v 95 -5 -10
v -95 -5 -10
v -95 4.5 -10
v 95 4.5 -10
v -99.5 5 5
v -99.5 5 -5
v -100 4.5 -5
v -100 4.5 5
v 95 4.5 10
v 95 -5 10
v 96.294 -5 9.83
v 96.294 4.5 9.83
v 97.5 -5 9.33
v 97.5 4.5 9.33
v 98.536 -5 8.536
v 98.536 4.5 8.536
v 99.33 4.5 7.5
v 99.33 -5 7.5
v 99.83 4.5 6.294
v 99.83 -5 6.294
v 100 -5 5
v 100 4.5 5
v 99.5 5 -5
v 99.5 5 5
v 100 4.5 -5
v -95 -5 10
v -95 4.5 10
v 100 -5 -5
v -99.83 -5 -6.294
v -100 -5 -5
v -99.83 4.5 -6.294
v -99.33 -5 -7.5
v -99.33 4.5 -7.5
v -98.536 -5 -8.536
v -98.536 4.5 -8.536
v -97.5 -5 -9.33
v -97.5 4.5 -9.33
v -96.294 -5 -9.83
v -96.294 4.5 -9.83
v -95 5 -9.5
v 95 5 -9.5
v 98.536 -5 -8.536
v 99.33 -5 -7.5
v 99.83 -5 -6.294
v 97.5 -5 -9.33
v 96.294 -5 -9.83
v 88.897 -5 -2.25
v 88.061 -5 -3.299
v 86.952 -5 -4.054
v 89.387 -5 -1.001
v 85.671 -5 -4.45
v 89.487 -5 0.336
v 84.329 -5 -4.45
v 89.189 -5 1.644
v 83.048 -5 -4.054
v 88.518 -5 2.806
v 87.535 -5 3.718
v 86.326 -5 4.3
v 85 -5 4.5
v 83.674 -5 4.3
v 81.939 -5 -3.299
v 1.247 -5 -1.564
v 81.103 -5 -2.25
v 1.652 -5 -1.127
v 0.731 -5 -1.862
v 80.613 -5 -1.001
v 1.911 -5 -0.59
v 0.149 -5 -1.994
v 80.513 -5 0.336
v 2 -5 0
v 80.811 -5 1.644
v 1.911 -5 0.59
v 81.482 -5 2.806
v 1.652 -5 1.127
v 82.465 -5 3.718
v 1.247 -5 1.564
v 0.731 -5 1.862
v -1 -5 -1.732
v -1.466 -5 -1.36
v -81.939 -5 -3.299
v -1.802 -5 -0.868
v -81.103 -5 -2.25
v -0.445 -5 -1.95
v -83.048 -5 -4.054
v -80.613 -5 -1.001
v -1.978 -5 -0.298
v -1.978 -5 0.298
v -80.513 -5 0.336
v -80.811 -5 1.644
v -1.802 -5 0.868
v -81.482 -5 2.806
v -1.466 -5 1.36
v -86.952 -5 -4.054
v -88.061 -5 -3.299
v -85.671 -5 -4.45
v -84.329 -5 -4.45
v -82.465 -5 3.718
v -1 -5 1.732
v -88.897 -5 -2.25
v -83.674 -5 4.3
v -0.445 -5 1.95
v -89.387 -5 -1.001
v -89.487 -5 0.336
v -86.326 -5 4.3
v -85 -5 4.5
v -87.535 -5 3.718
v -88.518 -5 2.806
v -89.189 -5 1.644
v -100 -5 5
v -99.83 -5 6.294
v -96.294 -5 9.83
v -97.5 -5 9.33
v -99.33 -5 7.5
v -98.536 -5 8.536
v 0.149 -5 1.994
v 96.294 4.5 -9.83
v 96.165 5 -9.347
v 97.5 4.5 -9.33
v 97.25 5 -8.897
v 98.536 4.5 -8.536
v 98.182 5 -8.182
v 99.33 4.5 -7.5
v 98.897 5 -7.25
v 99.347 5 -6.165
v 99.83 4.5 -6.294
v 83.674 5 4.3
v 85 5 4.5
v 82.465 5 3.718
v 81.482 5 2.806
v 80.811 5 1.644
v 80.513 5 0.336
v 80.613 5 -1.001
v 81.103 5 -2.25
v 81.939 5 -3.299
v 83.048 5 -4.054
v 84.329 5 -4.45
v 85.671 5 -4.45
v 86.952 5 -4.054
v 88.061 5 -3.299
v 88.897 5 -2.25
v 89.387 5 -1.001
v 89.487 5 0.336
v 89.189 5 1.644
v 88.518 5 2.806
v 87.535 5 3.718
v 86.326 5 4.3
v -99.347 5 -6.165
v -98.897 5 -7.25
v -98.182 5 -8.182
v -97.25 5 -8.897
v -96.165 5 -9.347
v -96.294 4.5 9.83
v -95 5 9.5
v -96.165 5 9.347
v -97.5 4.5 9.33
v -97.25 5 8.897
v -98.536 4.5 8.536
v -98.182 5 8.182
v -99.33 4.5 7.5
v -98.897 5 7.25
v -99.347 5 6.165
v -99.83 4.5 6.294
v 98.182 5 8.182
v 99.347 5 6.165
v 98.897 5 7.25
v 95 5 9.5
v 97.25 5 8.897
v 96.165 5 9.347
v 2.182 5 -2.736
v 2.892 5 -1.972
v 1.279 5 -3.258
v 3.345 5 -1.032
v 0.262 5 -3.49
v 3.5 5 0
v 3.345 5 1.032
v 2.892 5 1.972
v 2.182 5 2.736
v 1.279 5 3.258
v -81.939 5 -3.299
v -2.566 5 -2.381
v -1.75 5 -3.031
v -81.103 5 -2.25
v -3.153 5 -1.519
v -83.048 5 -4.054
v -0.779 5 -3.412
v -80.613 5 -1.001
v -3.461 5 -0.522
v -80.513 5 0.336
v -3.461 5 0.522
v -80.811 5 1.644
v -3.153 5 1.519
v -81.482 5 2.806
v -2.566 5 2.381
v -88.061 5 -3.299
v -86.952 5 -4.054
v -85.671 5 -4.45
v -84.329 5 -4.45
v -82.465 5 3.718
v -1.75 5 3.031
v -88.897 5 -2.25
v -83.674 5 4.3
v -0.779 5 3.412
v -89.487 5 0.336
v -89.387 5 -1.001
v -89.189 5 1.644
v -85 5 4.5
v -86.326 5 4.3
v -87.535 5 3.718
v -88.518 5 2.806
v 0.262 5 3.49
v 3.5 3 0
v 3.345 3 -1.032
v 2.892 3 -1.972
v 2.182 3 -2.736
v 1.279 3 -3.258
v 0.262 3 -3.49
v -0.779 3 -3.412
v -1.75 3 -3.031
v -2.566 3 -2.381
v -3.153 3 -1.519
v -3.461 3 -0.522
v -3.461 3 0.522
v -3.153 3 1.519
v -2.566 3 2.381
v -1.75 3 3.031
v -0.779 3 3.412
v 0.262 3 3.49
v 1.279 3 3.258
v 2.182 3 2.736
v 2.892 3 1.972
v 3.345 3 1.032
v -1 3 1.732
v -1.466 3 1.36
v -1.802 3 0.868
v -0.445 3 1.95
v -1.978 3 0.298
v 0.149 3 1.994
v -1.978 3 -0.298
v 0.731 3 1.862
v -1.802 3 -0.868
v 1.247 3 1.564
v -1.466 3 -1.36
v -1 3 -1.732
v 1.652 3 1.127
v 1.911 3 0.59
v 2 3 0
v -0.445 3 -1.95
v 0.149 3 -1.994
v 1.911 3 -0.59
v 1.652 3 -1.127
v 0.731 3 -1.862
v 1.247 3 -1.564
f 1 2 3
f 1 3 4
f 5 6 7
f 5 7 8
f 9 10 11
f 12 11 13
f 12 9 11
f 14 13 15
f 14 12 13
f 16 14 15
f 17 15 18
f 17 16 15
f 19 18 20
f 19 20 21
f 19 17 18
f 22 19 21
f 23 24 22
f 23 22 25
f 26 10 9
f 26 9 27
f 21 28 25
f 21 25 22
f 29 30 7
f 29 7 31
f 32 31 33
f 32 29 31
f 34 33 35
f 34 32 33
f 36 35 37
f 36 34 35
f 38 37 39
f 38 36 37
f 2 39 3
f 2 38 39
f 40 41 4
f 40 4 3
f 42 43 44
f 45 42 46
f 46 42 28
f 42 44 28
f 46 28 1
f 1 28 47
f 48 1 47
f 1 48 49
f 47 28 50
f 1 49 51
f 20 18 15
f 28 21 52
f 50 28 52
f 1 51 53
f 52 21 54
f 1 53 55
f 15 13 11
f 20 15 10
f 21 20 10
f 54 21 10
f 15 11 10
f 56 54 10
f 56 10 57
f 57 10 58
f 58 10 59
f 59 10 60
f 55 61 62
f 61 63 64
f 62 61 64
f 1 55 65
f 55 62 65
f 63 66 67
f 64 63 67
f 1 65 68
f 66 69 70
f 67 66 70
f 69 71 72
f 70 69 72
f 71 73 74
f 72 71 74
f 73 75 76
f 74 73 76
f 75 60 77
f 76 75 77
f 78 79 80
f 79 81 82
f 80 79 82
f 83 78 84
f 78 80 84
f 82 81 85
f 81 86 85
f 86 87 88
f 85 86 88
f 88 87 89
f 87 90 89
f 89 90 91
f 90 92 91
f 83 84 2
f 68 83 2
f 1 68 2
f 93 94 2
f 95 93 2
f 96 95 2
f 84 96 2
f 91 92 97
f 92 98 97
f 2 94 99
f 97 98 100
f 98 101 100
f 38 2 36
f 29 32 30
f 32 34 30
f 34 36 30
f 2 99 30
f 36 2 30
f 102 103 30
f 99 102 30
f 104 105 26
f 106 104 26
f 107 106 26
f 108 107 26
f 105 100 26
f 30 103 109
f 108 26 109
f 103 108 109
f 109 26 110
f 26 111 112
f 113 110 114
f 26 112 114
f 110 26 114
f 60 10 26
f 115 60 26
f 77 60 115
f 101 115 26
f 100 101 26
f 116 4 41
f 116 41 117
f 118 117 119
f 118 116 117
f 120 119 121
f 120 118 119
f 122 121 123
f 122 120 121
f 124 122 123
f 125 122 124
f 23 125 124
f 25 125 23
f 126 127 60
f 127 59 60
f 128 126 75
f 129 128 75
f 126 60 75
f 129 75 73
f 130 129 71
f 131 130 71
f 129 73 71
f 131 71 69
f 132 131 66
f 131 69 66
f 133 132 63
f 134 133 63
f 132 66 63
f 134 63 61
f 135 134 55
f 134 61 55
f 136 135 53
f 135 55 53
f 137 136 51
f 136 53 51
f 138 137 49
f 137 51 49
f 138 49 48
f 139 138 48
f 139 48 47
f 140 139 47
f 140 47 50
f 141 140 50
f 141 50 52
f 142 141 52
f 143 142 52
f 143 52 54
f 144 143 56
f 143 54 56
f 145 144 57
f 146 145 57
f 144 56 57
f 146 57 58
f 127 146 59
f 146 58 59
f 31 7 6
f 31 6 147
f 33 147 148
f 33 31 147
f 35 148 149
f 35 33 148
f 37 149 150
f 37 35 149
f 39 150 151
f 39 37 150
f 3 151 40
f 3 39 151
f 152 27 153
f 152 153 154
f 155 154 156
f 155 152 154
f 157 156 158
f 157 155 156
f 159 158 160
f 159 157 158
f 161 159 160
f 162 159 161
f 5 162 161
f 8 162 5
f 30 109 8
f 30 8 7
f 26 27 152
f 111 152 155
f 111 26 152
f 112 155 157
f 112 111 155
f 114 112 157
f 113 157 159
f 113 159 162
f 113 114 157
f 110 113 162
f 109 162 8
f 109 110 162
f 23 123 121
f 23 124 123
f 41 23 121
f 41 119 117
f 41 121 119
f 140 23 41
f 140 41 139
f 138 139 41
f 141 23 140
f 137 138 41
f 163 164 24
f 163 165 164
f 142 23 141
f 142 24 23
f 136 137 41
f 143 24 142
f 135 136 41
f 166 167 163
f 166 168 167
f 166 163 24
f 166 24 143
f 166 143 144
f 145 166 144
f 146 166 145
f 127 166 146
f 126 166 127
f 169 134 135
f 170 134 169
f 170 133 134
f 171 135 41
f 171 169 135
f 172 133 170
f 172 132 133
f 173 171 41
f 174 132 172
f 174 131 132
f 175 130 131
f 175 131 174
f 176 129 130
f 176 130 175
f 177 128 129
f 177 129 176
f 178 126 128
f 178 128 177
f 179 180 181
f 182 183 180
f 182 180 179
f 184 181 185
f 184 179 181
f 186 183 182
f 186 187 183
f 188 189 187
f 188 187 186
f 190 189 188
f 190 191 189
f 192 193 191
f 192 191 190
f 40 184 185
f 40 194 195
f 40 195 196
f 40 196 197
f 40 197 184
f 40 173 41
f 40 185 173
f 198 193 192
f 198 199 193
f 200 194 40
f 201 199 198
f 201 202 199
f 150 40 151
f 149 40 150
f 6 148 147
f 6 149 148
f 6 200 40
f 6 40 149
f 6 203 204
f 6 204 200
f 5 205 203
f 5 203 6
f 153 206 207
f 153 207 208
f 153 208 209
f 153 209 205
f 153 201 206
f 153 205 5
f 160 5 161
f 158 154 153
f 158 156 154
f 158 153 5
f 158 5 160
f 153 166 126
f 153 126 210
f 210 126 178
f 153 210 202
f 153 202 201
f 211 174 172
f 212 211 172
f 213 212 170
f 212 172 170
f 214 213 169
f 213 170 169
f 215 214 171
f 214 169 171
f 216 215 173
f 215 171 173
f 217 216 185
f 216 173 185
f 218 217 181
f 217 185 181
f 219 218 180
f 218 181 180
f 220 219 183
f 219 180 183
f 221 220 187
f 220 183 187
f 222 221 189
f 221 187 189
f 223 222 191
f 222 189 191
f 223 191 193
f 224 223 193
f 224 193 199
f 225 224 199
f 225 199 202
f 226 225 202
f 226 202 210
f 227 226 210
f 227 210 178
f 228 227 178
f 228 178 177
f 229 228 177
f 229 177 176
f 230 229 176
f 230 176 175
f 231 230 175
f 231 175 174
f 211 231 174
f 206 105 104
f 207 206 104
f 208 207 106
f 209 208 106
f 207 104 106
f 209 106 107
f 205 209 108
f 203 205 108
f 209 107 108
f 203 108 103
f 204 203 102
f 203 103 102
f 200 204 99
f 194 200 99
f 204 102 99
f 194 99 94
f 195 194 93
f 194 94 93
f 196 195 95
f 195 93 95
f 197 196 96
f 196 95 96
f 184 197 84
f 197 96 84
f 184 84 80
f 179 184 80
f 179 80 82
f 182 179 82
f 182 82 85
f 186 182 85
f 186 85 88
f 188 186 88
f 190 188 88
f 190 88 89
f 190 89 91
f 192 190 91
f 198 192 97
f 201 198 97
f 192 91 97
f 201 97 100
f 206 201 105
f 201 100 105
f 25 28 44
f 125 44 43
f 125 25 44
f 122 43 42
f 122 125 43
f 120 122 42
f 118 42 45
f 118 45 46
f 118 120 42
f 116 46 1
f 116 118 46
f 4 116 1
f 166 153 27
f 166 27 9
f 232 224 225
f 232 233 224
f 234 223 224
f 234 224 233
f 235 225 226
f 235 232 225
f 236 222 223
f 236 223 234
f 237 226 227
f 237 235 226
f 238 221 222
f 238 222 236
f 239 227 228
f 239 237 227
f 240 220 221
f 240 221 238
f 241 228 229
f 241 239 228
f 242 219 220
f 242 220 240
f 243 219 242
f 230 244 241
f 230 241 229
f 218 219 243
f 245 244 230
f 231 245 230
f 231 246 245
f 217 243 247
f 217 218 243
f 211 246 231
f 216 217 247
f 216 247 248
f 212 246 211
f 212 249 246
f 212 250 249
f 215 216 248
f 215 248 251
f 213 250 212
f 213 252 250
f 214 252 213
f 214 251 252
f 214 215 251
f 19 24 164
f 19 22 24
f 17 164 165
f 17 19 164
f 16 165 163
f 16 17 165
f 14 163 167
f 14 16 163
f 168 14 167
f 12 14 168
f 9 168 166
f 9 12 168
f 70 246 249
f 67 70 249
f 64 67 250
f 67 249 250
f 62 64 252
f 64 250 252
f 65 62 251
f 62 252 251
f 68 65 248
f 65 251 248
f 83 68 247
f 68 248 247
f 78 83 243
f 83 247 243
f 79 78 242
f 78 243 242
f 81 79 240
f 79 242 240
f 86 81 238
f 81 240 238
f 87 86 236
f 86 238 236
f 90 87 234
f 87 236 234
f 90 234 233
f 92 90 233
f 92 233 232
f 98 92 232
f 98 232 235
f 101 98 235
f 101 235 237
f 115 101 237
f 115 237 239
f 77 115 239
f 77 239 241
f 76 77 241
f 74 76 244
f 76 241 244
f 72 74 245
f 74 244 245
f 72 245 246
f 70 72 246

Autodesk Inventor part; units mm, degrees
ref_plane "YZ Plane" through (0, 0, 0) normal (1, 0, 0) x (0, 1, 0)
ref_plane "XZ Plane" through (0, 0, 0) normal (0, 1, 0) x (-1, 0, 0)
ref_plane "XY Plane" through (0, 0, 0) normal (0, 0, 1) x (1, 0, 0)
sketch "Sketch1" plane through (0, 0, 0) normal (0, 1, 0) x (-1, 0, 0)
  line L0 (-100, 10) -> (100, 10)
  line L1 (100, 10) -> (100, -10)
  line L2 (100, -10) -> (-100, -10)
  line L3 (-100, -10) -> (-100, 10)
  line L4 (-100, 10) -> (100, -10) construction
  line L5 (100, 10) -> (-100, -10) construction
  point P0 (0, 0)
  dimension "Length" = 200
  dimension "Width" = 20
extrude "Extrusion1" add sketch "Sketch1" along normal mid plane 10
sketch "Sketch2" plane through (0, 5, 0) normal (0, 1, 0) x (1, 0, 0)
  circle A0 centre (0, 0) radius 2
  dimension "d4" = 4
extrude "Extrusion2" cut sketch "Sketch2" against normal up to surface (10 mm away)
sketch "Sketch3" plane through (0, 5, 0) normal (0, 1, 0) x (1, 0, 0)
  circle A0 centre (0, 0) radius 2 projected
  point P0 (-15, 0)
  point P1 (15, 0)
  dimension "d7" = 30
  dimension "d8" = 15
hole "Hole1" [suppressed]
sketch "Sketch4" plane through (0, 5, 0) normal (0, 1, 0) x (1, 0, 0)
  point P0 (0, 0)
  point P1 (-85, 0)
  point P2 (85, 0)
  dimension "d16" = 170
  dimension "d17" = 85
hole "Hole2" at (-85, 5, 0) at (85, 5, 0) direction (0, -1, 0) diameter 9 end through all
sketch "Sketch5" plane through (0, 5, 0) normal (0, 1, 0) x (1, 0, 0)
  circle A0 centre (0, 0) radius 2 projected
  circle A1 centre (0, 0) radius 3.5
  dimension "d25" = 7
extrude "Extrusion3" cut sketch "Sketch5" against normal blind 2
fillet "Fillet1" radius 5 4 edges at (-100, 0, 10) (-100, 0, -10) (100, 0, 10) (100, 0, -10)
chamfer "Chamfer1" distance 0.5 angle 45 8 edges at (0, 5, 10) (98.5355, 5, 8.5355) (100, 5, 0) (98.5355, 5, -8.5355) (0, 5, -10) (-98.5355, 5, -8.5355) (-100, 5, 0) (-98.5355, 5, 8.5355)
equation "\"d8\" = 0.5 * d7"
equation "\"d17\" = 0.5 * d16"
properties part number "Lower Arm Brass Plate" material "Brass, Soft Yellow"
